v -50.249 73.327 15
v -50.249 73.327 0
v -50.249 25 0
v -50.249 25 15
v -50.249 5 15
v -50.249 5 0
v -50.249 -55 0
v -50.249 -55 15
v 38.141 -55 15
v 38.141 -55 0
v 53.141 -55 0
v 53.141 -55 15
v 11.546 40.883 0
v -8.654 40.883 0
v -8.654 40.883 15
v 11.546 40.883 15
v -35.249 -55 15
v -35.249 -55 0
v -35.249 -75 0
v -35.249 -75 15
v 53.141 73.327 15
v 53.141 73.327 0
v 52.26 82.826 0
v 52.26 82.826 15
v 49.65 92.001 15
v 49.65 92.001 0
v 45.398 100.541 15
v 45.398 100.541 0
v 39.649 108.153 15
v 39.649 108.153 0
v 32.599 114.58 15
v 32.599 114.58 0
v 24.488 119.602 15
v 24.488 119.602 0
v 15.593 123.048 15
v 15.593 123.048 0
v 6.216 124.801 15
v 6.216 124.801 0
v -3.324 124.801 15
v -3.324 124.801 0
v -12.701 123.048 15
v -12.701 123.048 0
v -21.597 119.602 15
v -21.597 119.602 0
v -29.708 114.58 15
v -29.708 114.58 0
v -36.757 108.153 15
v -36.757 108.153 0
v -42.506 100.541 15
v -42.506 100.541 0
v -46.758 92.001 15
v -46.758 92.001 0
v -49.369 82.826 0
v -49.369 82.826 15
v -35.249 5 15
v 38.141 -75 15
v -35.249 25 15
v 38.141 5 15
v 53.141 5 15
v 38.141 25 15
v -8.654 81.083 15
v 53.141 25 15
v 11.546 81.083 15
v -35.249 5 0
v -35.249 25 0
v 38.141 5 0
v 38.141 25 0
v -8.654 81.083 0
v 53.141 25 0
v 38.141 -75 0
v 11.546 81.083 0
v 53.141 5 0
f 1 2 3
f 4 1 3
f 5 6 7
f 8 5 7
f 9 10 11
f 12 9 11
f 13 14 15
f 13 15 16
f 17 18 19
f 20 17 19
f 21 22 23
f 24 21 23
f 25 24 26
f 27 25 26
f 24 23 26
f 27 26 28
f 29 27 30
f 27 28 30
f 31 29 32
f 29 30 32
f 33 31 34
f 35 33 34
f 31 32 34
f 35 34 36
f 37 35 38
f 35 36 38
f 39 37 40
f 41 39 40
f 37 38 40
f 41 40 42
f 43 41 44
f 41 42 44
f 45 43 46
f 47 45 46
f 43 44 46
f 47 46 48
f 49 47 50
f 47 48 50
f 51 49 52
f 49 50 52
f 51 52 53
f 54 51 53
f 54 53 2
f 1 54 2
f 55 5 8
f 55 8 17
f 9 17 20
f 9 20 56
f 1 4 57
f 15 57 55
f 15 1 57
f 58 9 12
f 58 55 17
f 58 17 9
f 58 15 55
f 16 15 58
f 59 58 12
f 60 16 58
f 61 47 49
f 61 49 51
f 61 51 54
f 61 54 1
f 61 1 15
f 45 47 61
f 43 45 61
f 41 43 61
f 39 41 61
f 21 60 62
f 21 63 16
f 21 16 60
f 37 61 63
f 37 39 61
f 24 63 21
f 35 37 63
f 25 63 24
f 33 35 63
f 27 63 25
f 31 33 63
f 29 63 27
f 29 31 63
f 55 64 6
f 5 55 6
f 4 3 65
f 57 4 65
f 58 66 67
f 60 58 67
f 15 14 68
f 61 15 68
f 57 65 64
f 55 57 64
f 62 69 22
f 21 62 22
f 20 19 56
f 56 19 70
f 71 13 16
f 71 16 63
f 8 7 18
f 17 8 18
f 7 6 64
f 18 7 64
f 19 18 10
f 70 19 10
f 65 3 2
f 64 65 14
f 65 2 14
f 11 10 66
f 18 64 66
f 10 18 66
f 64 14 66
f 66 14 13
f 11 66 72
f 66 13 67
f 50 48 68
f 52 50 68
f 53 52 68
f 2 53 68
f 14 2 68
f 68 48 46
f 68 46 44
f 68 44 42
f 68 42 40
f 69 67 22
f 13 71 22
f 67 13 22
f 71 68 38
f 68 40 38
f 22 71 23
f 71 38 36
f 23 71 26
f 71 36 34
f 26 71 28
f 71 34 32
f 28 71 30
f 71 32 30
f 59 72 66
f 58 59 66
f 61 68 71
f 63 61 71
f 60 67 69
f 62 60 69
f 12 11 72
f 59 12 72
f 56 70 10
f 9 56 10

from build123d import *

# Parameters (mm, degrees)
ESQUISSE1_W        = 20.2
ESQUISSE1_H        = 40.2
BOSS_EXTRU_1_DEPTH = 15


with BuildPart() as part:
    # Esquisse1 → Boss.-Extru.1 (new body)
    with BuildSketch(Plane.XY):
        with BuildLine():
            Line((-35.249311761, -55), (-35.249311761, -75))
            Line((-35.249311761, -75), (38.140688239, -75))
            Line((38.140688239, -75), (38.140688239, -55))
            Line((38.140688239, -55), (53.140688239, -55))
            Line((53.140688239, -55), (53.140688239, 5))
            Line((53.140688239, 5), (38.140688239, 5))
            Line((38.140688239, 5), (38.140688239, 25))
            Line((38.140688239, 25), (53.140688239, 25))
            Line((53.140688239, 25), (53.140688239, 73.326682602))
            ThreePointArc((53.140688239, 73.326682602), (1.445688239, 125.021682602), (-50.249311761, 73.326682602))
            Line((-50.249311761, 73.326682602), (-50.249311761, 25))
            Line((-50.249311761, 25), (-35.249311761, 25))
            Line((-35.249311761, 25), (-35.249311761, 5))
            Line((-35.249311761, 5), (-50.249311761, 5))
            Line((-50.249311761, 5), (-50.249311761, -55))
            Line((-50.249311761, -55), (-35.249311761, -55))
        make_face()
        with Locations((1.445688239, 60.982767533)):
            Rectangle(ESQUISSE1_W, ESQUISSE1_H, mode=Mode.SUBTRACT)
    extrude(amount=BOSS_EXTRU_1_DEPTH)


solid = part.part
